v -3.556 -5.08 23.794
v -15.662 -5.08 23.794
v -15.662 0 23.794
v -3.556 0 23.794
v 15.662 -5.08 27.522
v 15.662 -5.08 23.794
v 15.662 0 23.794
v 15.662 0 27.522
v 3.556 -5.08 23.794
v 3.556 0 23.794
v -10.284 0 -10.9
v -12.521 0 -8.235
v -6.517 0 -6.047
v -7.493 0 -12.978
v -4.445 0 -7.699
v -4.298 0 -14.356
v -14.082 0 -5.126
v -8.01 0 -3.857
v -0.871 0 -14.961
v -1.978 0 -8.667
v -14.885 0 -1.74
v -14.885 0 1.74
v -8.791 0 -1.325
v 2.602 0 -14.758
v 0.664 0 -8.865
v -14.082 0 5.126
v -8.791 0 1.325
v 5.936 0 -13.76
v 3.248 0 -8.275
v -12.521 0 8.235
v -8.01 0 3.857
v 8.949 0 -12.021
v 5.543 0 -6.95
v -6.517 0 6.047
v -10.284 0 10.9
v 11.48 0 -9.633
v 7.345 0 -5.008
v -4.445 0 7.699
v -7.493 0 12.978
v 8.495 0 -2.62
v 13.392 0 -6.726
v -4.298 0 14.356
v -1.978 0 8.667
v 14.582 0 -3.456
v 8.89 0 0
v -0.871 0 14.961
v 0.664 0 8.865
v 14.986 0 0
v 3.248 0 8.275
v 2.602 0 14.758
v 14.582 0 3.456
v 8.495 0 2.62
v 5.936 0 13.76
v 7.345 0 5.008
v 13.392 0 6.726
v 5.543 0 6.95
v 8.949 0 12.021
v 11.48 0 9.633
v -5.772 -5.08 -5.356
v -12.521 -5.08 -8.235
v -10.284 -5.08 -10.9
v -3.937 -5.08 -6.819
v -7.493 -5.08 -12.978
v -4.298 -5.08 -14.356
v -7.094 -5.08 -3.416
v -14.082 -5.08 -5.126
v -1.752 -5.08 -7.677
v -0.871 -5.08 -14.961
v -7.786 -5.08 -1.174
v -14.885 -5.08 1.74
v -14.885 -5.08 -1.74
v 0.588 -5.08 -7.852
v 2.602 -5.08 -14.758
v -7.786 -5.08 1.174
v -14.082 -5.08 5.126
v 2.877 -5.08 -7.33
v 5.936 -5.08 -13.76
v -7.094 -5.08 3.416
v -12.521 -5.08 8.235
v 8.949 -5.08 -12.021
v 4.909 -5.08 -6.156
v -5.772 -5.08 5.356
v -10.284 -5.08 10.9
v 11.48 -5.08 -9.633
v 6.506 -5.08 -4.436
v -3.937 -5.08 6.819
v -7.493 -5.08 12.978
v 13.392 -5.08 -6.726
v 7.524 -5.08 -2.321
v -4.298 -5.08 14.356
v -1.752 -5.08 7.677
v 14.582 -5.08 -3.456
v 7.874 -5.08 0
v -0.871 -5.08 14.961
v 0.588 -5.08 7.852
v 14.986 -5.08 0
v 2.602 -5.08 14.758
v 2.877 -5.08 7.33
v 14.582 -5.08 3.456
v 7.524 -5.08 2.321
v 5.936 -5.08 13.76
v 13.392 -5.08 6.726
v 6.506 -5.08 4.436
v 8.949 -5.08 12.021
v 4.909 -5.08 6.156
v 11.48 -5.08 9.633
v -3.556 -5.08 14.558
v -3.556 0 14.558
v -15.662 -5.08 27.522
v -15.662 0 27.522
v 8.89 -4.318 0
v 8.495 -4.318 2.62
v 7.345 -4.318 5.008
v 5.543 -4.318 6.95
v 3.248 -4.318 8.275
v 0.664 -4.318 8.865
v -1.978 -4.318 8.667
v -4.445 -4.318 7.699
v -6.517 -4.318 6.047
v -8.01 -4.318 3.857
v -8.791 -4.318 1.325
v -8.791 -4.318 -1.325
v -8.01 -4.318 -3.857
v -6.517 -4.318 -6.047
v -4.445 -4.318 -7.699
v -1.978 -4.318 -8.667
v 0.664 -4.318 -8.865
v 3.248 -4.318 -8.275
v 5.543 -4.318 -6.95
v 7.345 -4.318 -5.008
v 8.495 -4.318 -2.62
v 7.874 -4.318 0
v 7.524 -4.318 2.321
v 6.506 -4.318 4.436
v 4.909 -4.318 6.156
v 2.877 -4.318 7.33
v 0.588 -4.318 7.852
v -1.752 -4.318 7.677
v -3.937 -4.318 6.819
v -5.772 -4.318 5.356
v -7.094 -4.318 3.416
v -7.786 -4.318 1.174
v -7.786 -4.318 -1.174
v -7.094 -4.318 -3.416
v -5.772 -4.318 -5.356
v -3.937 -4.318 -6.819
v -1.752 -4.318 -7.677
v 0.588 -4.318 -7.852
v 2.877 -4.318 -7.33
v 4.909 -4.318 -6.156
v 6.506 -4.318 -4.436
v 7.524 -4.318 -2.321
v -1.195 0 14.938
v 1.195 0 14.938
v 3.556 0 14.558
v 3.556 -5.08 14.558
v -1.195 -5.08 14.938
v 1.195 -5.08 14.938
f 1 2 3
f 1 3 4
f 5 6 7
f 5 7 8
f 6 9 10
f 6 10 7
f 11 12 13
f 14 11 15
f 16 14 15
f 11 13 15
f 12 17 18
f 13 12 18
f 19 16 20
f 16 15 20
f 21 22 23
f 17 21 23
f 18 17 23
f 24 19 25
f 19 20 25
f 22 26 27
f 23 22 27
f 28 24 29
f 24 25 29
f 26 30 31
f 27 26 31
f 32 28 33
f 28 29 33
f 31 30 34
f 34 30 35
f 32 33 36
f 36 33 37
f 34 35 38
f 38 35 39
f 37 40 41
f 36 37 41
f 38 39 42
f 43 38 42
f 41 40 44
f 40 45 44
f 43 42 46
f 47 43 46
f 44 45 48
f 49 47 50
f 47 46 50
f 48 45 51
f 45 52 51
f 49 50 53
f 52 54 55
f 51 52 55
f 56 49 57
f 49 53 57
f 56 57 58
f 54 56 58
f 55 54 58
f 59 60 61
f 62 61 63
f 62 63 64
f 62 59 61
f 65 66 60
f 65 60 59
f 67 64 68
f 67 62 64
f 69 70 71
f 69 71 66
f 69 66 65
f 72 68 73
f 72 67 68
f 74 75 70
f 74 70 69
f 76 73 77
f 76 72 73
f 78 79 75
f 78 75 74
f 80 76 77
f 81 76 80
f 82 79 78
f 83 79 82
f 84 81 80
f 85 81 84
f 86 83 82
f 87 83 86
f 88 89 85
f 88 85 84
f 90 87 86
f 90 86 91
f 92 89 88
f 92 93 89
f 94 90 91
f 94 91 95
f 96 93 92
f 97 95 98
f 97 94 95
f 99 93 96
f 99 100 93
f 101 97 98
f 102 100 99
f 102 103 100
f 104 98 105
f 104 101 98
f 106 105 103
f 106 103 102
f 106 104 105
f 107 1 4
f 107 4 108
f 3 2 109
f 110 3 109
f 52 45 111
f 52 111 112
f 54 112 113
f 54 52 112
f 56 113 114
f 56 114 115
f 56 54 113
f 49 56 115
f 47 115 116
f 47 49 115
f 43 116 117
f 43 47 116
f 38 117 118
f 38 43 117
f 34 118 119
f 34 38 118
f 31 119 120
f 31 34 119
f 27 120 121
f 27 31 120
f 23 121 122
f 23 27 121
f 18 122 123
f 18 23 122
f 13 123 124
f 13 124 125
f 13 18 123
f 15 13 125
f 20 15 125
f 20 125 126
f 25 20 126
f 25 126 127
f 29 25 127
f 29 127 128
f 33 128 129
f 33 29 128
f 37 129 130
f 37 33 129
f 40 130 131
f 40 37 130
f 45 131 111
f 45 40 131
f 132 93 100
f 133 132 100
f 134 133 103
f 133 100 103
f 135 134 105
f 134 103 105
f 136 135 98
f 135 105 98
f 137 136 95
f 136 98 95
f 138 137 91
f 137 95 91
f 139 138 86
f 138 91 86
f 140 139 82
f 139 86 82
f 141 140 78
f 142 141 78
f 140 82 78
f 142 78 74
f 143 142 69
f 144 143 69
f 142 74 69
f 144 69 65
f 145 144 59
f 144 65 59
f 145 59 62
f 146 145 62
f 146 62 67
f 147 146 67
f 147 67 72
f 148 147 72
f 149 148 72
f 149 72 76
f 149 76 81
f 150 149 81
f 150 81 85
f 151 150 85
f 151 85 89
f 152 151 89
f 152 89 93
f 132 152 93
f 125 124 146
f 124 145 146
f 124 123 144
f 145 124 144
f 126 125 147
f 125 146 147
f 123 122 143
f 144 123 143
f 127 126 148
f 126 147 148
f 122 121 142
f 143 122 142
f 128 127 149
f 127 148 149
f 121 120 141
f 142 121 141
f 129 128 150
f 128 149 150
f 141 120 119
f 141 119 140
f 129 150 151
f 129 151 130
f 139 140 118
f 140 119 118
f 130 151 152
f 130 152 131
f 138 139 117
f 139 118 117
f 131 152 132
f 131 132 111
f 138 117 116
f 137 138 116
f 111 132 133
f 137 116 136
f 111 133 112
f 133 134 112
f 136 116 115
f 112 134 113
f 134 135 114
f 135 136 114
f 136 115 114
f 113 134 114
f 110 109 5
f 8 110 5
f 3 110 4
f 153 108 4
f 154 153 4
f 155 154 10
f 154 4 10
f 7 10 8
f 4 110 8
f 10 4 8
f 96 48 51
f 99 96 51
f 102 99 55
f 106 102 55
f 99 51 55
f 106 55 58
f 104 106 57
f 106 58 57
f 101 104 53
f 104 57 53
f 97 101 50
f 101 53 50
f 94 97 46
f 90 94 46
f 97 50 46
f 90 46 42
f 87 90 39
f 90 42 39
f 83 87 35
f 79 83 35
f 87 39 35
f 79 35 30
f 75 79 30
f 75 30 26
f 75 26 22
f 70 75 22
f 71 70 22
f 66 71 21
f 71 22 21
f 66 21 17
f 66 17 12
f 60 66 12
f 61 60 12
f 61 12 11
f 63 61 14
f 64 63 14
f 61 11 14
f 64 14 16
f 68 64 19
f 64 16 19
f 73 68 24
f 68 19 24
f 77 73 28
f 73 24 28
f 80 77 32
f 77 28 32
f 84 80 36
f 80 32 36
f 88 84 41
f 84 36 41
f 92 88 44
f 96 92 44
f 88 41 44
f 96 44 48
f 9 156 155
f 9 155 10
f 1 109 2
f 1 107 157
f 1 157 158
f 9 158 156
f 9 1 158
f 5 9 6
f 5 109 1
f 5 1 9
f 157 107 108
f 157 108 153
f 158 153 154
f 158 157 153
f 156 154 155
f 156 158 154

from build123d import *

# Parameters (mm, degrees)
F0_R     = 14.986
F1_DEPTH = 5.08
F2_R     = 7.874
F3_DEPTH = 5.081
F4_R     = 8.89
F5_DEPTH = 4.318
F7_DEPTH = 5.08
F8_W     = 31.323832
F8_H     = 3.728606
F9_DEPTH = 5.08


with BuildPart() as f1:
    # F0 (on Front) → F1 (new body)
    with BuildSketch(Plane.XZ):
        Circle(F0_R)
    extrude(amount=F1_DEPTH)

    # F2 (on face) → F3 (cut, through all)
    with BuildSketch(Plane.XZ.offset(5.08)):
        Circle(F2_R)
    extrude(amount=-F3_DEPTH, mode=Mode.SUBTRACT)

    # F4 (on Front) → F5 (cut)
    with BuildSketch(Plane.XZ):
        Circle(F4_R)
    extrude(amount=F5_DEPTH, mode=Mode.SUBTRACT)


with BuildPart() as f7:
    # F6 (on face) → F7 (new body)
    with BuildSketch(Plane.XZ.offset(5.08)):
        with BuildLine():
            ThreePointArc((-3.556, 14.55799), (0, 14.986), (3.556, 14.55799))
            Line((3.556, 14.55799), (3.556, 24.189062))
            Line((3.556, 24.189062), (-3.556, 24.189062))
            Line((-3.556, 24.189062), (-3.556, 14.55799))
        make_face()
    extrude(amount=-F7_DEPTH)

    # F8 (on face) → F9 (join)
    with BuildSketch(Plane.XZ.offset(5.08)):
        with Locations((0, 25.657849)):
            Rectangle(F8_W, F8_H)
    extrude(amount=-F9_DEPTH)


solid = Compound([f1.part, f7.part])
